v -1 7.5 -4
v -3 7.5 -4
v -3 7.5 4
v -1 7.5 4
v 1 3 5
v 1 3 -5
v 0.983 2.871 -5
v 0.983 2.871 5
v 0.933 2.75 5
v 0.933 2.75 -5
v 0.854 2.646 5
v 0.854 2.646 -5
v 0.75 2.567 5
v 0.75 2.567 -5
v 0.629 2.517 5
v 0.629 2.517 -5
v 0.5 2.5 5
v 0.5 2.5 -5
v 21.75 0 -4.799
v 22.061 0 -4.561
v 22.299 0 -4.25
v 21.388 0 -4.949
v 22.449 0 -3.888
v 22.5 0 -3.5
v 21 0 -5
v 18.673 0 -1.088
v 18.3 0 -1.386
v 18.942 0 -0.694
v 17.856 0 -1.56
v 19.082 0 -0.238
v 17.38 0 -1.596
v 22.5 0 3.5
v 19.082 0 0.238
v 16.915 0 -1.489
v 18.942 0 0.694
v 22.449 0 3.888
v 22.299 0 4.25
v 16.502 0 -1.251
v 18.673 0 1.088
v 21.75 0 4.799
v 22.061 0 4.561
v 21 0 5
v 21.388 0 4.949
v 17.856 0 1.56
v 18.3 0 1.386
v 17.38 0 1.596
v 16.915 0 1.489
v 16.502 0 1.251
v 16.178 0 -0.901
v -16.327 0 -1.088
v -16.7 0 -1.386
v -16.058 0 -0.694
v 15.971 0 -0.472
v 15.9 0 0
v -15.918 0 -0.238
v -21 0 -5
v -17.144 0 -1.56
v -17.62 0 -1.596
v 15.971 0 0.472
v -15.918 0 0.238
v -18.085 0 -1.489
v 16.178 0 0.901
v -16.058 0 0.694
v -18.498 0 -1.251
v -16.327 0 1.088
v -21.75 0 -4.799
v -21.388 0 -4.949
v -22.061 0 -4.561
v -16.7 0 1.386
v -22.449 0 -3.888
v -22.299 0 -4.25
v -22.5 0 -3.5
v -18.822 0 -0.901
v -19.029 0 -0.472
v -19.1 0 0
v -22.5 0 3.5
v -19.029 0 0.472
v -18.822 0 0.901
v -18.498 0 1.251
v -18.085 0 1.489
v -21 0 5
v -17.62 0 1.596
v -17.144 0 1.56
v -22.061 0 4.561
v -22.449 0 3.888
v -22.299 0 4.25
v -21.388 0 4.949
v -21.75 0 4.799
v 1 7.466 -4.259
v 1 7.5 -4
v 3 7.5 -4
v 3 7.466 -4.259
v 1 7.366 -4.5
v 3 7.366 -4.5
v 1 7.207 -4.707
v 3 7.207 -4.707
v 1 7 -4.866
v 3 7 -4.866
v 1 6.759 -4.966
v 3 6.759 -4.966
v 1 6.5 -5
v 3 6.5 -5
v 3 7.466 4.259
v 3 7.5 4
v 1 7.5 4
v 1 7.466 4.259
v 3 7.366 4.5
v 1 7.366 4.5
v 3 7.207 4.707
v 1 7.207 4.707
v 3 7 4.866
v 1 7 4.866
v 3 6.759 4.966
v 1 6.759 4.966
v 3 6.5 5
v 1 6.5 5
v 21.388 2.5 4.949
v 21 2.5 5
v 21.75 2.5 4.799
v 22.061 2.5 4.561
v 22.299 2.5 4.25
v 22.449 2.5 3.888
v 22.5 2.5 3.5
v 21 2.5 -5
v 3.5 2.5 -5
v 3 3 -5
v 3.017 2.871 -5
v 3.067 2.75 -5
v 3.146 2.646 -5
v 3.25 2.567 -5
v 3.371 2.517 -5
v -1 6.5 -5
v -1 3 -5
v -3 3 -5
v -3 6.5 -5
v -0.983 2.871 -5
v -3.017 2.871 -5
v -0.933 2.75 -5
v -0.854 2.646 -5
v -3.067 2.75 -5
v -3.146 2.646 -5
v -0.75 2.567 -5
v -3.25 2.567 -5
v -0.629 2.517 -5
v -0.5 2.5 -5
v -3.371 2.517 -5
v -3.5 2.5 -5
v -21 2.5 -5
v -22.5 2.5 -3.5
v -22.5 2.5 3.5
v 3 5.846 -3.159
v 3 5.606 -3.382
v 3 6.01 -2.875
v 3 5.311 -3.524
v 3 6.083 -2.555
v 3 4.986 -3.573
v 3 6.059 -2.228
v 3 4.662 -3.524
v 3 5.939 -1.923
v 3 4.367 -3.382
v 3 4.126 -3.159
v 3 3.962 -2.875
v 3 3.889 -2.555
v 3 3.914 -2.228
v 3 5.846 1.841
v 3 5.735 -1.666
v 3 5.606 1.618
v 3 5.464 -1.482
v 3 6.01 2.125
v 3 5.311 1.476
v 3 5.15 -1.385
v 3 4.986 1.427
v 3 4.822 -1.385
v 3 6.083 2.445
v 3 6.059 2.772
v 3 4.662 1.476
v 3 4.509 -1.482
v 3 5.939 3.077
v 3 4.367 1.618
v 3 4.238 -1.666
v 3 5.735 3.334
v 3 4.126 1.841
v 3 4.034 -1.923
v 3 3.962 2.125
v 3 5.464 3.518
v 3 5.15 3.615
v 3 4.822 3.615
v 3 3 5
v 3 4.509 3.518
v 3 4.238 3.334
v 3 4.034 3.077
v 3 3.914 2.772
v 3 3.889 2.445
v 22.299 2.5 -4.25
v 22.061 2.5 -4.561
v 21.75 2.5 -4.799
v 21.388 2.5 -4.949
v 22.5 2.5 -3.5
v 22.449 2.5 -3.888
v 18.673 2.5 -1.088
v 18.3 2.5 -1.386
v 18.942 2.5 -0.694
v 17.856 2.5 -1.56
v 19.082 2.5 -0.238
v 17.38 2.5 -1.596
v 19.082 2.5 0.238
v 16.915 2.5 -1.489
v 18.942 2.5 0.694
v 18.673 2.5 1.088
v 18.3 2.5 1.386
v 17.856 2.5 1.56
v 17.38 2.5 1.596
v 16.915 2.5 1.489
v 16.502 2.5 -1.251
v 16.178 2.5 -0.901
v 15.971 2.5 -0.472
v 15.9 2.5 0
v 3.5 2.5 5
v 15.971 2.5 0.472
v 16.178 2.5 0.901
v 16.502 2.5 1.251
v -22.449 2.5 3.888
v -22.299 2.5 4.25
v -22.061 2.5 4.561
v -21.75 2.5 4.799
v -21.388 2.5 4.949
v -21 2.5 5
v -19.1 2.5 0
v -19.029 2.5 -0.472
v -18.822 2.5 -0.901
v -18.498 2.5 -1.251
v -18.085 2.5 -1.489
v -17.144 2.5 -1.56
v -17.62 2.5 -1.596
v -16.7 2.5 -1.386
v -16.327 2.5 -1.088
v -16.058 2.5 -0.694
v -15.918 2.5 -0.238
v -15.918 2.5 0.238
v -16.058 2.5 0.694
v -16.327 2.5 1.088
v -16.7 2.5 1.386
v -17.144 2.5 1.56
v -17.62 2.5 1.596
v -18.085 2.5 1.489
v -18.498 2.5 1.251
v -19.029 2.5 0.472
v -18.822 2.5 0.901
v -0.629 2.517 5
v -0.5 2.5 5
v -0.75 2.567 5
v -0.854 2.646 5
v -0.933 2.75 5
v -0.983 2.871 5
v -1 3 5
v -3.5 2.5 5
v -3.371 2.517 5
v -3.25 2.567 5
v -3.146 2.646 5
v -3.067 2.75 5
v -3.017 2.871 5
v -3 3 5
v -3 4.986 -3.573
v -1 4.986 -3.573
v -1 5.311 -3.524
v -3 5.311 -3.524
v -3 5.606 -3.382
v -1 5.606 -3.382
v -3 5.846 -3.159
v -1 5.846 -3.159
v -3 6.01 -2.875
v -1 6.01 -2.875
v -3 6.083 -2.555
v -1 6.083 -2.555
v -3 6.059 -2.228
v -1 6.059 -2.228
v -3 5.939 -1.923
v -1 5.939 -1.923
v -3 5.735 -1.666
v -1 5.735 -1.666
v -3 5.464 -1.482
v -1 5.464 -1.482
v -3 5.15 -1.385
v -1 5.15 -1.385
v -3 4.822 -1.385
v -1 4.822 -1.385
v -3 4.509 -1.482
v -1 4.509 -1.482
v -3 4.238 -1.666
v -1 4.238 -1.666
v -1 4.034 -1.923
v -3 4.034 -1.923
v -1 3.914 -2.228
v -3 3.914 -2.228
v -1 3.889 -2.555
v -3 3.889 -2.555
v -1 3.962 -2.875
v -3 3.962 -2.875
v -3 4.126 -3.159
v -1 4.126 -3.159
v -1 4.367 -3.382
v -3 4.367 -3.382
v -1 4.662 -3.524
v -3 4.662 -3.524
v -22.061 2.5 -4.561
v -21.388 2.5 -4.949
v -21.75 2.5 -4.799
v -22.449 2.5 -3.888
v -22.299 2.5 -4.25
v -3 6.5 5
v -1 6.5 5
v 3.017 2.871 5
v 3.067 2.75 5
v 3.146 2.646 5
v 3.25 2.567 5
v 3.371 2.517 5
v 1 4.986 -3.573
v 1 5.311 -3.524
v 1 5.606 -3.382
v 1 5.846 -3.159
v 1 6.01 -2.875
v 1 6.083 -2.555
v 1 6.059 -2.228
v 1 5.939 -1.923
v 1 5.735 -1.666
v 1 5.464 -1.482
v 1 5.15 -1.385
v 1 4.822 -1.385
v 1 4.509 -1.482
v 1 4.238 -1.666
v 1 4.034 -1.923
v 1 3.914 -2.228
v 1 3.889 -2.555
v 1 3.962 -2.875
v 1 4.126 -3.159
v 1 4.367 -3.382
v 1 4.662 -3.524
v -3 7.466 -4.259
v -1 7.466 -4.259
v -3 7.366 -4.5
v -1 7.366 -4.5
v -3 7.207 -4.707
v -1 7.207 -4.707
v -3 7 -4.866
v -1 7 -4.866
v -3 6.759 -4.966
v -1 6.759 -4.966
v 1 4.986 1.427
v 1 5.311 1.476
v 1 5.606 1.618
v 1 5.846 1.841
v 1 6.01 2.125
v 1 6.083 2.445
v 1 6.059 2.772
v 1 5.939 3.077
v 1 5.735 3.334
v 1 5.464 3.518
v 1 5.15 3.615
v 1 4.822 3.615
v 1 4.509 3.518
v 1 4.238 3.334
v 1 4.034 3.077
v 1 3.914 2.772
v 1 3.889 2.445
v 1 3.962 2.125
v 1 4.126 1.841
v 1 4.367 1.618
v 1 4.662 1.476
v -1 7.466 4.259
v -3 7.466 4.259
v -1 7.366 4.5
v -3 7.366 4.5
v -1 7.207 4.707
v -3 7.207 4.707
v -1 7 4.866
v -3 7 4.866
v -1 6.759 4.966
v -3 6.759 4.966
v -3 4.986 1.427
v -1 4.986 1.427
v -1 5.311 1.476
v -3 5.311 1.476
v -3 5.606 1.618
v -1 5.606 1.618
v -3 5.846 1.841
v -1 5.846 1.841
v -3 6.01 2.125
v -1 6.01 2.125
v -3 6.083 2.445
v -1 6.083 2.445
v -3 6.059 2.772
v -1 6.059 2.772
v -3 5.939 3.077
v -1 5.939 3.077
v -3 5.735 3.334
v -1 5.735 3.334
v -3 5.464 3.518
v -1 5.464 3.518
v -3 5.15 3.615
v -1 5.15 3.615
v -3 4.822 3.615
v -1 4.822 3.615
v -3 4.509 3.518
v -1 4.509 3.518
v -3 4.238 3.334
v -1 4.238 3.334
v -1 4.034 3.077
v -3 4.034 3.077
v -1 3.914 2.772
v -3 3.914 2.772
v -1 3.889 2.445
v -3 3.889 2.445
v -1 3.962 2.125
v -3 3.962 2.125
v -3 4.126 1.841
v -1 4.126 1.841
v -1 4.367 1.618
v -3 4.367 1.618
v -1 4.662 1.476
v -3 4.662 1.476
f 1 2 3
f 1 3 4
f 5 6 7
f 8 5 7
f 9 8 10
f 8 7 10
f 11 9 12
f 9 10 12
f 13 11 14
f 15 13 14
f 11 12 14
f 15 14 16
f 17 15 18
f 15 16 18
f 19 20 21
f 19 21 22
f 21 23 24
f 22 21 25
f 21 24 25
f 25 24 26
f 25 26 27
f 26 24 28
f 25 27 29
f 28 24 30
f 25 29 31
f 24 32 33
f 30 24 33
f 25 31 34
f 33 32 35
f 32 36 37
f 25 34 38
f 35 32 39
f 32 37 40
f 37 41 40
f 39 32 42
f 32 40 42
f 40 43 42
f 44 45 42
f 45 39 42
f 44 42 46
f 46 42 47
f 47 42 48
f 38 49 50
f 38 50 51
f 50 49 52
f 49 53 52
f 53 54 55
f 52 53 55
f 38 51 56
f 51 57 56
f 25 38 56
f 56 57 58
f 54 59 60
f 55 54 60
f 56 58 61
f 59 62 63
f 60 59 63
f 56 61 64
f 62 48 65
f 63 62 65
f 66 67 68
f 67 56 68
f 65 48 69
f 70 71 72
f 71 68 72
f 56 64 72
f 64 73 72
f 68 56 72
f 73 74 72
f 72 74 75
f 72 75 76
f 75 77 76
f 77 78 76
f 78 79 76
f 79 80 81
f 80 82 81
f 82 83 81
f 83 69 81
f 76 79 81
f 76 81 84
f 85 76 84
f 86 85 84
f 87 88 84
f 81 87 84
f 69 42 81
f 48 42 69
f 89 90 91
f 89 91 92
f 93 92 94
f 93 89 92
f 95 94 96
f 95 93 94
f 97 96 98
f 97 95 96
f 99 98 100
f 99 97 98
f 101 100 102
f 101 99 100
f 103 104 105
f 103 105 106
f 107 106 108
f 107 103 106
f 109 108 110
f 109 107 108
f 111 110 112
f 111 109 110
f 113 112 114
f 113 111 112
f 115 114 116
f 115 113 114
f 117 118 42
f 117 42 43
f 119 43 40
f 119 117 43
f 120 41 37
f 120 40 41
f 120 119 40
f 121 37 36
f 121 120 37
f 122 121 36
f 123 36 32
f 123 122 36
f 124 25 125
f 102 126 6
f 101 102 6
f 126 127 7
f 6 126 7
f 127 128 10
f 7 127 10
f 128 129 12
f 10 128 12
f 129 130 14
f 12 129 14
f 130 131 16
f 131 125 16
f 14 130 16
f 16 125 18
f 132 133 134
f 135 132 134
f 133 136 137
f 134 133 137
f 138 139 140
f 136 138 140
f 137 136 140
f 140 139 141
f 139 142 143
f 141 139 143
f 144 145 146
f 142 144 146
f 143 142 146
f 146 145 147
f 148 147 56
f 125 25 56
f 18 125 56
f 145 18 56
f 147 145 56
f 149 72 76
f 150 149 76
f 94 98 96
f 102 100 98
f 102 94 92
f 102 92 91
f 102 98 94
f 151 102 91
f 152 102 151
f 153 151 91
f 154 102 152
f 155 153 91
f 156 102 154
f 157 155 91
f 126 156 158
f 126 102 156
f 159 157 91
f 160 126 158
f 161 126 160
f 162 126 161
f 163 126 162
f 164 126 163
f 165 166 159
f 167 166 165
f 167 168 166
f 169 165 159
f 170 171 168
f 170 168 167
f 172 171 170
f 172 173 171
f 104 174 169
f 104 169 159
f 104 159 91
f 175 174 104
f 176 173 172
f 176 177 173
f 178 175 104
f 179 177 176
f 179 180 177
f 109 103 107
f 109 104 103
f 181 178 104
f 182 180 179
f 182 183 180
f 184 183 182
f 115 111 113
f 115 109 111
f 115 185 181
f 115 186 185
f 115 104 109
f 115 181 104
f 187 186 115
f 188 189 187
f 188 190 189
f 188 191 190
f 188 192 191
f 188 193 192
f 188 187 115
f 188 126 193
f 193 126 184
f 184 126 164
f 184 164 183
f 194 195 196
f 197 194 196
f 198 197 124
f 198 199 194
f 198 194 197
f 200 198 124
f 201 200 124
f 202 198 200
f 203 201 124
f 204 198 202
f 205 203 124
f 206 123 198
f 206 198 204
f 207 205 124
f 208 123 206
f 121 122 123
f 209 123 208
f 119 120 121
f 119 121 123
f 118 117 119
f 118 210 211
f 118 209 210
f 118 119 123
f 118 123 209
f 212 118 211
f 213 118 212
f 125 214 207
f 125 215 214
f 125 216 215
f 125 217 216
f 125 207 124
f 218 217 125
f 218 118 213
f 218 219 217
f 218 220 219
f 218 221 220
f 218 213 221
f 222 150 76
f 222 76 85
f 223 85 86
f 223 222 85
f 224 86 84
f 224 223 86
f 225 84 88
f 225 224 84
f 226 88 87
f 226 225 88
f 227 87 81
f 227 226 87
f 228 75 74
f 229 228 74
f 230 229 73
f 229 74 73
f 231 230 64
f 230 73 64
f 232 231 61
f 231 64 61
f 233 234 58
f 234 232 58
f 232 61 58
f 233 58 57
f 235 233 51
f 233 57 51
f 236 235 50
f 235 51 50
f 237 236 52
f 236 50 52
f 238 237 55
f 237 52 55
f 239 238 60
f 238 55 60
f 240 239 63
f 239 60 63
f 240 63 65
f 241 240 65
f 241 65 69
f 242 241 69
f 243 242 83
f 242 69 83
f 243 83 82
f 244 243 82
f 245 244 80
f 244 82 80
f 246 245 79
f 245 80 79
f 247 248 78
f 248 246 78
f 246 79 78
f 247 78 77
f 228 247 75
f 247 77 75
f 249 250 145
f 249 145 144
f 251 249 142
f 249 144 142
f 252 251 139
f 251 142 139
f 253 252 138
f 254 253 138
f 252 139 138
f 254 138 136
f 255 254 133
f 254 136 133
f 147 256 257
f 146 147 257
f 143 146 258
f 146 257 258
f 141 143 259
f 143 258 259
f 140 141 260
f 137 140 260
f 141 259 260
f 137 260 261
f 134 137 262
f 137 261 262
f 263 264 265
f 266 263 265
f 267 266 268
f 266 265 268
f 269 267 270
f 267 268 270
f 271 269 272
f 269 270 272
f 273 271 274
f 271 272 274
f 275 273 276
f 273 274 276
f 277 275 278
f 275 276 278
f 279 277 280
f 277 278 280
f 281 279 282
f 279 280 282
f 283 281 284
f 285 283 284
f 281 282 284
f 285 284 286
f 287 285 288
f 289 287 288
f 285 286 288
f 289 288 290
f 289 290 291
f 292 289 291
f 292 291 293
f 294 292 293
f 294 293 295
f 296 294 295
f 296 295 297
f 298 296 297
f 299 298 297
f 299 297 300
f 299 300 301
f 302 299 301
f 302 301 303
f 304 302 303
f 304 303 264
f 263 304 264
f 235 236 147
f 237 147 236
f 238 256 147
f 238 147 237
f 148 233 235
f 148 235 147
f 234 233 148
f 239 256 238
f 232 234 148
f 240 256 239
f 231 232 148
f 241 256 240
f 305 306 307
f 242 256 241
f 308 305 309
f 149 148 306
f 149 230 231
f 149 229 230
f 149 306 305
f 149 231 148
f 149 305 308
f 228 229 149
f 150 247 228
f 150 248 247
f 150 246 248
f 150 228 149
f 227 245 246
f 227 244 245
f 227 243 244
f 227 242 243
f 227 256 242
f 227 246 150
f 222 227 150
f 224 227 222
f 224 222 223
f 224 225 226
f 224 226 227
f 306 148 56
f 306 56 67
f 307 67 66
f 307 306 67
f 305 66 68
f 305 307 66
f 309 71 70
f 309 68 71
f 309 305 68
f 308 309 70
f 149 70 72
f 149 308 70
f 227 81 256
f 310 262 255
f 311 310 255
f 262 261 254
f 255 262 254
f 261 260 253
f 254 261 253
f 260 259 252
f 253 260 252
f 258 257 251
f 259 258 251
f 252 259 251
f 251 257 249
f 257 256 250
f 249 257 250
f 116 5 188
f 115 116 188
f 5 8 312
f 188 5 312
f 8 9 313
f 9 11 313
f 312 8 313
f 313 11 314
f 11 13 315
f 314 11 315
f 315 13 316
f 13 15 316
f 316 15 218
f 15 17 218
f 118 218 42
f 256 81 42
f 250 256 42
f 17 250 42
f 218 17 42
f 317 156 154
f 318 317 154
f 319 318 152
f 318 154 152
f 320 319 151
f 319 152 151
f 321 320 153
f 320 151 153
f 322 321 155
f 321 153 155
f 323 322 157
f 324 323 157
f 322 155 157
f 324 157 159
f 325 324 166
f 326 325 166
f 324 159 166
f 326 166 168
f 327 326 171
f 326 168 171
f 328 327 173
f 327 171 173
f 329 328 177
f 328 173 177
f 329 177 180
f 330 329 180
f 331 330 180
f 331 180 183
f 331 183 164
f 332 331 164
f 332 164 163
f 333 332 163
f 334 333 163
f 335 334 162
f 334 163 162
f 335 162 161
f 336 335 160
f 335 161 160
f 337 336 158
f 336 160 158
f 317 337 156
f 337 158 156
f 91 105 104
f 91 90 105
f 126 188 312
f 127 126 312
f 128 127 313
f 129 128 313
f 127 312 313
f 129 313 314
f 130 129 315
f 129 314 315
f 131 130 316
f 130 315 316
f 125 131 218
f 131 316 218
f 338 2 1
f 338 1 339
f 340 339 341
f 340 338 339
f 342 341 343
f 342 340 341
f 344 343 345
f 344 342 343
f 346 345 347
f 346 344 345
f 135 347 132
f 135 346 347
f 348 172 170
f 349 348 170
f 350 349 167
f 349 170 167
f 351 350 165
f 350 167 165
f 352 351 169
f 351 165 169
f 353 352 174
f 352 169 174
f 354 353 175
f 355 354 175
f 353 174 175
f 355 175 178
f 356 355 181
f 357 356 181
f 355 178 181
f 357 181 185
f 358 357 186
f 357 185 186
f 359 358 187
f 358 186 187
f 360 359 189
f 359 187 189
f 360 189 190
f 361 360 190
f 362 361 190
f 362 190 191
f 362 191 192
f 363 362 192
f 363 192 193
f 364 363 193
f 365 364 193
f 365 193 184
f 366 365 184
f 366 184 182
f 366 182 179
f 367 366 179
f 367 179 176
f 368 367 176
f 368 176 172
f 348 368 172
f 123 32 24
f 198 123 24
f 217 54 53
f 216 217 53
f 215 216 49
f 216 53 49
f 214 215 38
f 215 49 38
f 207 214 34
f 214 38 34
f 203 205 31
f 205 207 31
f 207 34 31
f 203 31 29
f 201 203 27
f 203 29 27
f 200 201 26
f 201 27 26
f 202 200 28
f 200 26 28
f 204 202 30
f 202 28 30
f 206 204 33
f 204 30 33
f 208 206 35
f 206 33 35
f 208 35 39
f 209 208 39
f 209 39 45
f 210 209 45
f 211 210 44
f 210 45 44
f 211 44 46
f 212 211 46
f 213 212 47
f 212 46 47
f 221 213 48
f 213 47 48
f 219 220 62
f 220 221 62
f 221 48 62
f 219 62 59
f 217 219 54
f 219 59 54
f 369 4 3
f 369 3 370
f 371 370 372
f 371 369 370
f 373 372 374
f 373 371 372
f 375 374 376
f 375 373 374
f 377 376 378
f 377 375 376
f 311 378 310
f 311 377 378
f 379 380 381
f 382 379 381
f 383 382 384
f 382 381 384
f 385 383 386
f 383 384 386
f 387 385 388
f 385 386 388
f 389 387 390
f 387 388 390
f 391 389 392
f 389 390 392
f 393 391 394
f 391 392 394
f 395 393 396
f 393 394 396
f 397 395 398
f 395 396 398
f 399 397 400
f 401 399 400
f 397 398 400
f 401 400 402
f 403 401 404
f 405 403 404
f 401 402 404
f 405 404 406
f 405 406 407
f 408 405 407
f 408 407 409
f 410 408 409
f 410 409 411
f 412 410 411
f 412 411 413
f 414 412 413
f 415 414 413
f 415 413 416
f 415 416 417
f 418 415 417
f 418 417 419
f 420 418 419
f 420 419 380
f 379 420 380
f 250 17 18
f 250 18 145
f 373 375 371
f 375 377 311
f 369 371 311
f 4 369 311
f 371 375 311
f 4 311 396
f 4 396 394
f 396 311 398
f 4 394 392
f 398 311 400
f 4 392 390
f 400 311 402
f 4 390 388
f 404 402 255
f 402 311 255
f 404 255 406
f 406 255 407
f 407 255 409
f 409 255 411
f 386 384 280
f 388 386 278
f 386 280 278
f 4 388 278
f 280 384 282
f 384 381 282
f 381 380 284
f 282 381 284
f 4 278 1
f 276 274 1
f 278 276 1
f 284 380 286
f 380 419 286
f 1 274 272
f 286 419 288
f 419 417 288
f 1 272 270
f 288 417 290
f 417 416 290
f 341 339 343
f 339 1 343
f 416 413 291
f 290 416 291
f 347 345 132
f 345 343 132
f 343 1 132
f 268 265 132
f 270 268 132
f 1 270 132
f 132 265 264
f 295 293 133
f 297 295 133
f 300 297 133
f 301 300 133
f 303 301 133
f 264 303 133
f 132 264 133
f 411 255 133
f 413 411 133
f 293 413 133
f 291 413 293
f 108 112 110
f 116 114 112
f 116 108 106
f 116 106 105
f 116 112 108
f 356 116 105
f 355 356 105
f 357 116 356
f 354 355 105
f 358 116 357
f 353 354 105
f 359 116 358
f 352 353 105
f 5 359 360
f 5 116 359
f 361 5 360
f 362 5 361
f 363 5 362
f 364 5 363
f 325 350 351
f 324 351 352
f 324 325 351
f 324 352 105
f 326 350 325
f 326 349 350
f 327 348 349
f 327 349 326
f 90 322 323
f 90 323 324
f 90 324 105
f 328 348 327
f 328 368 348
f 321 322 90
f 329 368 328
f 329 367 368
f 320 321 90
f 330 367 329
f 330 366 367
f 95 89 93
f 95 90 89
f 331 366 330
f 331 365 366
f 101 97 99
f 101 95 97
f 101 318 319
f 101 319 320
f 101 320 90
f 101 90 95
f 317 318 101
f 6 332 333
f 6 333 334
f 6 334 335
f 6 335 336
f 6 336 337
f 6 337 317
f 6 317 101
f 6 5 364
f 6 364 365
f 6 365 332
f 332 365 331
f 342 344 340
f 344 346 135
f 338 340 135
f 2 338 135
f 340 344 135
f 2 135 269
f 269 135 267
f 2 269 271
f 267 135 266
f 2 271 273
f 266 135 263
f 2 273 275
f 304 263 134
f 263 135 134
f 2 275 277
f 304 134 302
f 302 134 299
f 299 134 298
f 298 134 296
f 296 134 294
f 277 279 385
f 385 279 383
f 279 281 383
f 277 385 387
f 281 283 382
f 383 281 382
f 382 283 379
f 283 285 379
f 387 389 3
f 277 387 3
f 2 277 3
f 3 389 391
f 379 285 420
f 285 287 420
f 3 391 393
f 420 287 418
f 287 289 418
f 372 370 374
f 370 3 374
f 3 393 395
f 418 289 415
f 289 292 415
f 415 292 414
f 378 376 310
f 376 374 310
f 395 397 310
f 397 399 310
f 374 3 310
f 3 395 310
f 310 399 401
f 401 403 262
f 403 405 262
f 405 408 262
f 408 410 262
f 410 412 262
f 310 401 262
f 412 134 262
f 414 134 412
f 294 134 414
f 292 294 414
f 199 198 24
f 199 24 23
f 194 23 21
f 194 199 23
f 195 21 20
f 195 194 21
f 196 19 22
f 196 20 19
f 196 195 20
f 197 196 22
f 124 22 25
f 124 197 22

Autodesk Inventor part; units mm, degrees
ref_plane "YZ Plane" through (0, 0, 0) normal (1, 0, 0) x (0, 1, 0)
ref_plane "XZ Plane" through (0, 0, 0) normal (0, 1, 0) x (-1, 0, 0)
ref_plane "XY Plane" through (0, 0, 0) normal (0, 0, 1) x (1, 0, 0)
sketch "Sketch1" plane through (0, 0, 0) normal (0, 1, 0) x (-1, 0, 0)
  line L0 (22.5, 5) -> (-22.5, 5)
  line L1 (-22.5, 5) -> (-22.5, -5)
  line L2 (-22.5, -5) -> (22.5, -5)
  line L3 (22.5, -5) -> (22.5, 5)
  line L4 (22.5, 5) -> (17.5, 5) construction
  line L5 (17.5, 5) -> (17.5, 0) construction
  circle A0 centre (17.5, 0) radius 1.6
  line L6 (0, -5) -> (0, -10.3319) construction
  circle A1 centre (-17.5, 0) radius 1.6
  point P0 (0, 0)
  dimension "d2" = 5
  dimension "d3" = 3.2
extrude "Extrusion1" add sketch "Sketch1" along normal blind 2.5
fillet "Fillet1" radius 1.5 4 edges at (-22.5, 1.25, 5) (22.5, 1.25, 5) (22.5, 1.25, -5) (-22.5, 1.25, -5)
sketch "Sketch5" plane through (0, 2.5, 0) normal (0, 1, 0) x (1, 0, 0)
  line L0 (0, 0) -> (-1, 0) construction
  line L1 (0, 0) -> (1, 0) construction
  line L2 (-1, 5) -> (-3, 5)
  line L3 (-3, 5) -> (-3, -5)
  line L4 (-21, -5) -> (21, -5) projected
  line L5 (-3, -5) -> (-1, -5)
  line L6 (-1, -5) -> (-1, 5)
  line L7 (21, 5) -> (-21, 5) projected
  line L8 (0, 0) -> (0, 0.5432) construction
  line L9 (1, 5) -> (3, 5)
  line L10 (3, 5) -> (3, -5)
  line L11 (21, -5) -> (-21, -5)
  line L12 (3, -5) -> (1, -5)
  line L13 (1, -5) -> (1, 5)
  dimension "d33" = 2
extrude "Extrusion5" add sketch "Sketch5" along normal blind 5 contours L6 L4 L3 L2 | L7 L10 L4 L13
sketch "Sketch6" plane through (3, 2.5, 5) normal (1, 0, 0) x (0, 0, -1)
  line L0 (10, -2.5) -> (10, 0) construction
  line L1 (-0.0046, 4.9481) -> (10, 0) construction
  line L2 (10, 5) -> (0, 5) construction
  line L3 (10, 5) -> (0, 0) construction
  line L4 (4.9728, 2.4864) -> (4.9728, 3.4864) construction
  line L5 (4.9728, 2.4864) -> (2.4728, 2.4864) construction
  circle A0 centre (2.4728, 2.4864) radius 1.1
  circle A1 centre (7.4728, 2.4864) radius 1.1
  line L6 (0, 5) -> (10, 5)
  line L7 (10, 5) -> (10, 0)
  line L8 (10, 0) -> (0, 0)
  line L9 (0, 0) -> (0, 5)
  point P0 (5, -2.5)
  dimension "d38" = 2.2
extrude "Extrusion6" cut sketch "Sketch6" against normal blind 6 contours A0 | A1
fillet "Fillet6" radius 1 4 edges at (-2, 7.5, 5) (2, 7.5, 5) (2, 7.5, -5) (-2, 7.5, -5)
fillet "Fillet7" radius 0.5 4 edges at (-3, 2.5, 0) (-1, 2.5, 0) (3, 2.5, 0) (1, 2.5, 0)
properties part number "CarbonConnectorPlateConnector"
